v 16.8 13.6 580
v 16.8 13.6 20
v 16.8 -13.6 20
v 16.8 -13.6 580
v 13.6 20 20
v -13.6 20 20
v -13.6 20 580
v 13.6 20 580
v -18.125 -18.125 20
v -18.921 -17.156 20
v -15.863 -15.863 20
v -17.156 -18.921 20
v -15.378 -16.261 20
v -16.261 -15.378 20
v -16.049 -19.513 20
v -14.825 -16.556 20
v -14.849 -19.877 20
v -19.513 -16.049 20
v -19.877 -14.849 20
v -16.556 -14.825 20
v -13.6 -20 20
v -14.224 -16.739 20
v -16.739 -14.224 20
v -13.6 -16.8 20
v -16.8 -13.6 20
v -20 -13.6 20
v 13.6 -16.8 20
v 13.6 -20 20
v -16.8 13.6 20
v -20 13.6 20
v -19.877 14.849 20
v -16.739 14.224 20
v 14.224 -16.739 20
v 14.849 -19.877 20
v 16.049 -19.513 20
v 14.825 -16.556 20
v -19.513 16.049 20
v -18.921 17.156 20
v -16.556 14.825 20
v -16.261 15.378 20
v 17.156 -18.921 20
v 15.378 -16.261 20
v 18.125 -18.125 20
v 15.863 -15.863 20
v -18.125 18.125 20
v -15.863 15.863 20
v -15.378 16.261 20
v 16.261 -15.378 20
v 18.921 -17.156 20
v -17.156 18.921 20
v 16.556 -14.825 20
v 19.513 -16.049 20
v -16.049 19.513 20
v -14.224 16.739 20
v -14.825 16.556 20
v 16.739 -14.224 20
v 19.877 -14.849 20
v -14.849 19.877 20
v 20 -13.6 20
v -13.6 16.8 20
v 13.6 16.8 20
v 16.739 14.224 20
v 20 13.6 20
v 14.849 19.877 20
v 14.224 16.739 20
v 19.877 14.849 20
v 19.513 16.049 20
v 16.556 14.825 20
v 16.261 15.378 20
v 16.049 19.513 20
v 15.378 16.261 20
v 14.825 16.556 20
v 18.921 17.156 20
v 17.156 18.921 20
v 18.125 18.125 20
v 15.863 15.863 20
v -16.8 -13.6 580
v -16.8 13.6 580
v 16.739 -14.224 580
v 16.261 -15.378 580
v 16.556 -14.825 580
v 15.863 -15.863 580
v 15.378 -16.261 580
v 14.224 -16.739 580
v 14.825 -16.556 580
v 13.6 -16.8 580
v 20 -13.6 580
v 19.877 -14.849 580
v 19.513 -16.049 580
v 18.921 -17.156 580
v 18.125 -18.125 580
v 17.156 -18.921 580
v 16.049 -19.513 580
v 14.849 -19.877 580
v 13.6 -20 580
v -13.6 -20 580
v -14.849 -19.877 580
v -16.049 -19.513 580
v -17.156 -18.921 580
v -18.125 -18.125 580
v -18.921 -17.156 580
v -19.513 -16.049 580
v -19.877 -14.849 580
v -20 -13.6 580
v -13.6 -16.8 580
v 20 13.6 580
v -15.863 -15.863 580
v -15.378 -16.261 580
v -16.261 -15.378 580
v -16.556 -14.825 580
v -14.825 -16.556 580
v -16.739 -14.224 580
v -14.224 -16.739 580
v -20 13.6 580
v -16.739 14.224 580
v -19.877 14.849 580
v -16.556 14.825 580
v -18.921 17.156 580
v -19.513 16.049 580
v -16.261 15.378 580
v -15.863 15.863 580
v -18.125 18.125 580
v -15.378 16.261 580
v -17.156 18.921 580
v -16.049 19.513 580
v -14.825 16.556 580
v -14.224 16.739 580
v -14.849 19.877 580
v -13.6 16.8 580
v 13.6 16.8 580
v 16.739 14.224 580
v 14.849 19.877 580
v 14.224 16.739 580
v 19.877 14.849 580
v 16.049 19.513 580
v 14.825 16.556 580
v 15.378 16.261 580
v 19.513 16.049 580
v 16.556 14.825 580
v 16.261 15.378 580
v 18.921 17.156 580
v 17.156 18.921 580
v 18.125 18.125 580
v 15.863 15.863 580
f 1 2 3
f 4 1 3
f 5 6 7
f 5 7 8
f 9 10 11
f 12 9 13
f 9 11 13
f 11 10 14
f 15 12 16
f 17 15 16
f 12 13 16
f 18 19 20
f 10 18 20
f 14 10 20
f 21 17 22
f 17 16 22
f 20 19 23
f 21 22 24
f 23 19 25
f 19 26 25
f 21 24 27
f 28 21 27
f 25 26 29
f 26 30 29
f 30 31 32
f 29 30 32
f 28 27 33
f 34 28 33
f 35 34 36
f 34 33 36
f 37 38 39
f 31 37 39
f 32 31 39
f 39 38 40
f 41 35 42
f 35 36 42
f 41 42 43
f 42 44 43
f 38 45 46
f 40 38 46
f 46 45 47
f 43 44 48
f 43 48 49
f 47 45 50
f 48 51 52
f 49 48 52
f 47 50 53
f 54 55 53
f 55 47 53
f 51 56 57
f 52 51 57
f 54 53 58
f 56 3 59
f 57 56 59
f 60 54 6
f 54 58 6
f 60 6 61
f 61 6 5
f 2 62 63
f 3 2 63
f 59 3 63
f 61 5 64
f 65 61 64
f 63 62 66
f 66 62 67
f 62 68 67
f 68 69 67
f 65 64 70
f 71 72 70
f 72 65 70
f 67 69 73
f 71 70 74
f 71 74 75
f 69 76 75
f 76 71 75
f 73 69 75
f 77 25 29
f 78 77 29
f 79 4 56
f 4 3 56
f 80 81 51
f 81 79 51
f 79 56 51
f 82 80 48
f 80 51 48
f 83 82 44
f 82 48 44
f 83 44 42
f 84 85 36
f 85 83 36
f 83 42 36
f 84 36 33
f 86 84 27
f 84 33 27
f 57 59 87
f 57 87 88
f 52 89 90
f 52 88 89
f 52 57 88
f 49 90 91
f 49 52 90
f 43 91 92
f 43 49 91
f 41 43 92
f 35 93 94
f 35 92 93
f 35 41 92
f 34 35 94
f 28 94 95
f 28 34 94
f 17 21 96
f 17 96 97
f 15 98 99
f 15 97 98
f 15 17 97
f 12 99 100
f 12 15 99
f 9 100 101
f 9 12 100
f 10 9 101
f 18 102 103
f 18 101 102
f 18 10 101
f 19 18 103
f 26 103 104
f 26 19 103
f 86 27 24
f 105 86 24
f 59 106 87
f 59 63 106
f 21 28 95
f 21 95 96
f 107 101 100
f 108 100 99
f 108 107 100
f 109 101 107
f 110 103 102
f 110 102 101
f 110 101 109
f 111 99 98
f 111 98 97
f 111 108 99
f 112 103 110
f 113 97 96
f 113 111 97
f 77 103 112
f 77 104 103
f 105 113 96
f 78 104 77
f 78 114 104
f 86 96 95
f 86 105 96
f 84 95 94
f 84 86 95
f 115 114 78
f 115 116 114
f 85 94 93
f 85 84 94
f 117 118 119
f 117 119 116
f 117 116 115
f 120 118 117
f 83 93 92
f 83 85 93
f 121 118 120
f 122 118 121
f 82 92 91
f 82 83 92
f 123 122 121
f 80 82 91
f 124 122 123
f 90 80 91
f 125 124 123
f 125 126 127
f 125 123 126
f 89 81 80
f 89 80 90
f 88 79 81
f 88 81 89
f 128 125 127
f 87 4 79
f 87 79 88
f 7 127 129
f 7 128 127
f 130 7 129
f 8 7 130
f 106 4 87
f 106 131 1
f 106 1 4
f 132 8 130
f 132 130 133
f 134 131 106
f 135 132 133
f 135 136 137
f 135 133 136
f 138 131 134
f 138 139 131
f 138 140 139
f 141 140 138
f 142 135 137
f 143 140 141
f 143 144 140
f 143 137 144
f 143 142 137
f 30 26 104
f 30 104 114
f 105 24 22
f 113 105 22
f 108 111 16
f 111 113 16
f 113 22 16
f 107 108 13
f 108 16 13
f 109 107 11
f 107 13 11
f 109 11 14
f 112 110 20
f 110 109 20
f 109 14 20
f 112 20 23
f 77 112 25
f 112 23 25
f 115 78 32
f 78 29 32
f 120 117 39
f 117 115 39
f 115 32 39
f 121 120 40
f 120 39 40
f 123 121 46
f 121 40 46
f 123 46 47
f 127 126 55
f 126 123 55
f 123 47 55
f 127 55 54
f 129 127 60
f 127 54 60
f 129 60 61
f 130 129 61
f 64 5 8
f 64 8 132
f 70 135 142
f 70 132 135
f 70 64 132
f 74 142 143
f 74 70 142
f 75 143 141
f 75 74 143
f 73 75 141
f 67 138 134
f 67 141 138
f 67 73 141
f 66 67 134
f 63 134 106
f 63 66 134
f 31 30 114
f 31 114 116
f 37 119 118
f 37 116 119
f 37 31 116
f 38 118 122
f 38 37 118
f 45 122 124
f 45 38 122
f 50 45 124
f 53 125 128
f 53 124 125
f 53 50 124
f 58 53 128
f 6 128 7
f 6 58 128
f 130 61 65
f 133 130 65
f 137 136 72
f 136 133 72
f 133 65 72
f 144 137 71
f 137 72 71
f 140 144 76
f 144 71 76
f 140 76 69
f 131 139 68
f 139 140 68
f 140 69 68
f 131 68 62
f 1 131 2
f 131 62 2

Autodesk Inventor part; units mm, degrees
ref_plane "Start plane" through (0, 0, 20) normal (0, 0, 1) x (1, 0, 0)
ref_plane "End plane" through (0, 0, 580) normal (0, 0, 1) x (1, 0, 0)
sketch "Sketch" plane through (0, 0, 0) normal (0, 0, 1) x (1, 0, 0)
  line L0 (-20, -13.6) -> (-20, 13.6)
  line L1 (-13.6, 20) -> (13.6, 20)
  line L2 (20, 13.6) -> (20, -13.6)
  line L3 (13.6, -20) -> (-13.6, -20)
  arc A0 (-20, -13.6) -> (-13.6, -20) centre (-13.6, -13.6) ccw
  arc A1 (-13.6, 20) -> (-20, 13.6) centre (-13.6, 13.6) ccw
  arc A2 (20, 13.6) -> (13.6, 20) centre (13.6, 13.6) ccw
  arc A3 (13.6, -20) -> (20, -13.6) centre (13.6, -13.6) ccw
  arc A4 (-13.6, 16.8) -> (-16.8, 13.6) centre (-13.6, 13.6) ccw
  line L4 (-13.6, 16.8) -> (13.6, 16.8)
  arc A5 (16.8, 13.6) -> (13.6, 16.8) centre (13.6, 13.6) ccw
  line L5 (16.8, 13.6) -> (16.8, -13.6)
  arc A6 (13.6, -16.8) -> (16.8, -13.6) centre (13.6, -13.6) ccw
  line L6 (13.6, -16.8) -> (-13.6, -16.8)
  arc A7 (-16.8, -13.6) -> (-13.6, -16.8) centre (-13.6, -13.6) ccw
  line L7 (-16.8, -13.6) -> (-16.8, 13.6)
  line L8 (0, 29.8557) -> (0, -29.8557) construction
  line L9 (-29.8557, 0) -> (29.8557, 0) construction
  dimension "d7" = 6.4
  dimension "d10" = 40
  dimension "d11" = 40
  dimension "d12" = 3.2
  dimension "d15" = 20
  dimension "d16" = 20
extrude "Body" add sketch "Sketch" along normal up to surface (560 mm away) from surface at 20
sketch "Sketch3" plane through (0, 0, 0) normal (0, 0, 1) x (1, 0, 0)
  line L0 (0, 0) -> (10, 0)
ref_plane "Work Plane3" through (0, 0, 0) normal (0, -1, 0) x (1, 0, 0)
sketch "Sketch4" plane through (0, 0, 0) normal (0, -1, 0) x (1, 0, 0)
  line L0 (-2, 20) -> (12, 20)
  line L1 (-2, 580) -> (12, 580)
  dimension "d18" = 560
ref_plane "Work Plane4" through (-850, -13.6, 20) normal (0, 0, -1) x (-1, 0, 0)
split "Split1" plane through (-850, -13.6, 20) removes the side toward (0, 0, -1)
ref_plane "Work Plane5" through (550, -13.6, 580) normal (0, 0, 1) x (1, 0, 0)
split "Split2" plane through (550, -13.6, 580) removes the side toward (0, 0, 1)
equation "\"d7\" = G_IR"
equation "\"d10\" = G_H"
equation "\"d11\" = G_W"
equation "\"d12\" = G_T"
equation "\"d15\" = 0.5 * d10"
equation "\"d16\" = 0.5 * d11"
equation "\"d3\" = G_L"
equation "\"G_W\" = 40"
equation "\"G_H\" = 40"
equation "\"G_T\" = 3.2"
equation "\"G_IR\" = 6.4"
equation "\"G_L\" = d18"
properties part number "BSI 40 x 40 x 3.2 00000004" material "Steel, Mild"
